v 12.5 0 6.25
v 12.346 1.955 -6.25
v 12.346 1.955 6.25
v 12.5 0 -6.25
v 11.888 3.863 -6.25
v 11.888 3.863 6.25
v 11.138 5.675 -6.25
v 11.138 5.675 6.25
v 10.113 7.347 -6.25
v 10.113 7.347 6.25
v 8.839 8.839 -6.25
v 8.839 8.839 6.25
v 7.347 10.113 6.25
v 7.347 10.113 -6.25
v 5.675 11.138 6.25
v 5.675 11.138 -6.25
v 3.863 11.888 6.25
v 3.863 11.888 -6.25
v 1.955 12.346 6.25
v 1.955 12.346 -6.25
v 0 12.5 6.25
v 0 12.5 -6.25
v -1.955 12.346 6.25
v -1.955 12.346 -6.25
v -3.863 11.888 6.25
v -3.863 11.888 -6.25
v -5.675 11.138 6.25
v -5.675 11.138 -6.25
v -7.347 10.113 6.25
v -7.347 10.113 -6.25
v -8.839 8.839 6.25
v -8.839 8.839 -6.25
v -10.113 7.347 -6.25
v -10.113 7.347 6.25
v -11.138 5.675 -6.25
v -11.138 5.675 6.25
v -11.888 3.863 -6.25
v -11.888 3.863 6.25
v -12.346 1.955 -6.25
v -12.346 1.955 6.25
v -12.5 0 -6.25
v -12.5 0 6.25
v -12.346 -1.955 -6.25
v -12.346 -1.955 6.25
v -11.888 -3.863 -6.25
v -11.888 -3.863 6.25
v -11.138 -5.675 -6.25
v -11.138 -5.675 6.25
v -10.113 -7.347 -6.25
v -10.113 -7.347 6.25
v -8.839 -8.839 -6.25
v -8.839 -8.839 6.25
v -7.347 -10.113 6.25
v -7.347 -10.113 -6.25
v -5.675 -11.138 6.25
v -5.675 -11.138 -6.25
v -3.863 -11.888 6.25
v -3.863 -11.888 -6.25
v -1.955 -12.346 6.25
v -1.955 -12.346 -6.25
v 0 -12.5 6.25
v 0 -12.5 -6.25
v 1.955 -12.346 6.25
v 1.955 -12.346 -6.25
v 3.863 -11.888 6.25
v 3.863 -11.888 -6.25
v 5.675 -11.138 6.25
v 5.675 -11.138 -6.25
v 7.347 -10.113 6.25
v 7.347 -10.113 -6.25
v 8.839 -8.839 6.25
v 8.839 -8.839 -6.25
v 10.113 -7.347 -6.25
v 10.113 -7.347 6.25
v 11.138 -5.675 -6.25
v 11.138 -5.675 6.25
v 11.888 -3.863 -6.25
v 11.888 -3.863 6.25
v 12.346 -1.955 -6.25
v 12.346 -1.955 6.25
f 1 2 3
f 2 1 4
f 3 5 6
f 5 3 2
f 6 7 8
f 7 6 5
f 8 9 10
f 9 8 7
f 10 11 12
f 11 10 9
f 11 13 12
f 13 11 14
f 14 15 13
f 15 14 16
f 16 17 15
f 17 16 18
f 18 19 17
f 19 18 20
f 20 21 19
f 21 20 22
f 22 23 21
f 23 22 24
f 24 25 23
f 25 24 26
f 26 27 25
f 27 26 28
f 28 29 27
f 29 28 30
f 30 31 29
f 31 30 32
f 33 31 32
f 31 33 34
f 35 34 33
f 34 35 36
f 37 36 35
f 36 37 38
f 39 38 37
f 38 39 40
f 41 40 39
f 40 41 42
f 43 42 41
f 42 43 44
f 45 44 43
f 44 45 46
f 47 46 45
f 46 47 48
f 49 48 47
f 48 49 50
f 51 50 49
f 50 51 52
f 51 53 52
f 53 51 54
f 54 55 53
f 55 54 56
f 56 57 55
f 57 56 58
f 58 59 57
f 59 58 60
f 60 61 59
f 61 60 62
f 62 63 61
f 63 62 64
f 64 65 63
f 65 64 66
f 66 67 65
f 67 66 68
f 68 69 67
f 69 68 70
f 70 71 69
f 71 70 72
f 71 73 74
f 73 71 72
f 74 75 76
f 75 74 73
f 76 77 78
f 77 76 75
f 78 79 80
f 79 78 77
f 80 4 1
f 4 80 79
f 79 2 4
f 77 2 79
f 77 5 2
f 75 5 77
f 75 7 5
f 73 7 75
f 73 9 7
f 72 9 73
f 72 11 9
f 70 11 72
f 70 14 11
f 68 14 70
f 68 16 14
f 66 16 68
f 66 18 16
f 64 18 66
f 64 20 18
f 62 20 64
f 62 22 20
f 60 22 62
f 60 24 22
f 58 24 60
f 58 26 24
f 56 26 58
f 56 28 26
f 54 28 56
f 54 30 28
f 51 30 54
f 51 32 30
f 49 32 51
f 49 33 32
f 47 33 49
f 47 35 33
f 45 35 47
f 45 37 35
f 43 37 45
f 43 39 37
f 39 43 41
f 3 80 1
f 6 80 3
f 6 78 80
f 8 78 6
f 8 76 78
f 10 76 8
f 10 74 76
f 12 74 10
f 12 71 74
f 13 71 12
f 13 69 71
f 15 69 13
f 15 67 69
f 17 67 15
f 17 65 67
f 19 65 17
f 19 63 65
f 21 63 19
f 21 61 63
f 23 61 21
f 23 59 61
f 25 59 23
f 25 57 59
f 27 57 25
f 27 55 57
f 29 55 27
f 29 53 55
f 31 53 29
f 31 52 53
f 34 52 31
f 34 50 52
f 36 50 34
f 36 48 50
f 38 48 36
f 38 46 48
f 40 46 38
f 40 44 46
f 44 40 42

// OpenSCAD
//Author: Chris Correll
//Date: 10/1/2022
//Description: Parameterized code for primitive shapes to use on the APH graph board for teaching openSCAD concepts such as translation

//$fn = 10; //low
//$fn = 20; //med
$fn = 40; //hi

//APH graph board square
unit = 12.5; //one graph board square

//Parameters
w = 2; // width
dep = 4; //depth 
h = 1;  //height

//cube([w*unit,dep*unit,h*unit],center=true); 
//sphere(d=w*unit);
cylinder(h=h*unit,d=w*unit,center=true);
